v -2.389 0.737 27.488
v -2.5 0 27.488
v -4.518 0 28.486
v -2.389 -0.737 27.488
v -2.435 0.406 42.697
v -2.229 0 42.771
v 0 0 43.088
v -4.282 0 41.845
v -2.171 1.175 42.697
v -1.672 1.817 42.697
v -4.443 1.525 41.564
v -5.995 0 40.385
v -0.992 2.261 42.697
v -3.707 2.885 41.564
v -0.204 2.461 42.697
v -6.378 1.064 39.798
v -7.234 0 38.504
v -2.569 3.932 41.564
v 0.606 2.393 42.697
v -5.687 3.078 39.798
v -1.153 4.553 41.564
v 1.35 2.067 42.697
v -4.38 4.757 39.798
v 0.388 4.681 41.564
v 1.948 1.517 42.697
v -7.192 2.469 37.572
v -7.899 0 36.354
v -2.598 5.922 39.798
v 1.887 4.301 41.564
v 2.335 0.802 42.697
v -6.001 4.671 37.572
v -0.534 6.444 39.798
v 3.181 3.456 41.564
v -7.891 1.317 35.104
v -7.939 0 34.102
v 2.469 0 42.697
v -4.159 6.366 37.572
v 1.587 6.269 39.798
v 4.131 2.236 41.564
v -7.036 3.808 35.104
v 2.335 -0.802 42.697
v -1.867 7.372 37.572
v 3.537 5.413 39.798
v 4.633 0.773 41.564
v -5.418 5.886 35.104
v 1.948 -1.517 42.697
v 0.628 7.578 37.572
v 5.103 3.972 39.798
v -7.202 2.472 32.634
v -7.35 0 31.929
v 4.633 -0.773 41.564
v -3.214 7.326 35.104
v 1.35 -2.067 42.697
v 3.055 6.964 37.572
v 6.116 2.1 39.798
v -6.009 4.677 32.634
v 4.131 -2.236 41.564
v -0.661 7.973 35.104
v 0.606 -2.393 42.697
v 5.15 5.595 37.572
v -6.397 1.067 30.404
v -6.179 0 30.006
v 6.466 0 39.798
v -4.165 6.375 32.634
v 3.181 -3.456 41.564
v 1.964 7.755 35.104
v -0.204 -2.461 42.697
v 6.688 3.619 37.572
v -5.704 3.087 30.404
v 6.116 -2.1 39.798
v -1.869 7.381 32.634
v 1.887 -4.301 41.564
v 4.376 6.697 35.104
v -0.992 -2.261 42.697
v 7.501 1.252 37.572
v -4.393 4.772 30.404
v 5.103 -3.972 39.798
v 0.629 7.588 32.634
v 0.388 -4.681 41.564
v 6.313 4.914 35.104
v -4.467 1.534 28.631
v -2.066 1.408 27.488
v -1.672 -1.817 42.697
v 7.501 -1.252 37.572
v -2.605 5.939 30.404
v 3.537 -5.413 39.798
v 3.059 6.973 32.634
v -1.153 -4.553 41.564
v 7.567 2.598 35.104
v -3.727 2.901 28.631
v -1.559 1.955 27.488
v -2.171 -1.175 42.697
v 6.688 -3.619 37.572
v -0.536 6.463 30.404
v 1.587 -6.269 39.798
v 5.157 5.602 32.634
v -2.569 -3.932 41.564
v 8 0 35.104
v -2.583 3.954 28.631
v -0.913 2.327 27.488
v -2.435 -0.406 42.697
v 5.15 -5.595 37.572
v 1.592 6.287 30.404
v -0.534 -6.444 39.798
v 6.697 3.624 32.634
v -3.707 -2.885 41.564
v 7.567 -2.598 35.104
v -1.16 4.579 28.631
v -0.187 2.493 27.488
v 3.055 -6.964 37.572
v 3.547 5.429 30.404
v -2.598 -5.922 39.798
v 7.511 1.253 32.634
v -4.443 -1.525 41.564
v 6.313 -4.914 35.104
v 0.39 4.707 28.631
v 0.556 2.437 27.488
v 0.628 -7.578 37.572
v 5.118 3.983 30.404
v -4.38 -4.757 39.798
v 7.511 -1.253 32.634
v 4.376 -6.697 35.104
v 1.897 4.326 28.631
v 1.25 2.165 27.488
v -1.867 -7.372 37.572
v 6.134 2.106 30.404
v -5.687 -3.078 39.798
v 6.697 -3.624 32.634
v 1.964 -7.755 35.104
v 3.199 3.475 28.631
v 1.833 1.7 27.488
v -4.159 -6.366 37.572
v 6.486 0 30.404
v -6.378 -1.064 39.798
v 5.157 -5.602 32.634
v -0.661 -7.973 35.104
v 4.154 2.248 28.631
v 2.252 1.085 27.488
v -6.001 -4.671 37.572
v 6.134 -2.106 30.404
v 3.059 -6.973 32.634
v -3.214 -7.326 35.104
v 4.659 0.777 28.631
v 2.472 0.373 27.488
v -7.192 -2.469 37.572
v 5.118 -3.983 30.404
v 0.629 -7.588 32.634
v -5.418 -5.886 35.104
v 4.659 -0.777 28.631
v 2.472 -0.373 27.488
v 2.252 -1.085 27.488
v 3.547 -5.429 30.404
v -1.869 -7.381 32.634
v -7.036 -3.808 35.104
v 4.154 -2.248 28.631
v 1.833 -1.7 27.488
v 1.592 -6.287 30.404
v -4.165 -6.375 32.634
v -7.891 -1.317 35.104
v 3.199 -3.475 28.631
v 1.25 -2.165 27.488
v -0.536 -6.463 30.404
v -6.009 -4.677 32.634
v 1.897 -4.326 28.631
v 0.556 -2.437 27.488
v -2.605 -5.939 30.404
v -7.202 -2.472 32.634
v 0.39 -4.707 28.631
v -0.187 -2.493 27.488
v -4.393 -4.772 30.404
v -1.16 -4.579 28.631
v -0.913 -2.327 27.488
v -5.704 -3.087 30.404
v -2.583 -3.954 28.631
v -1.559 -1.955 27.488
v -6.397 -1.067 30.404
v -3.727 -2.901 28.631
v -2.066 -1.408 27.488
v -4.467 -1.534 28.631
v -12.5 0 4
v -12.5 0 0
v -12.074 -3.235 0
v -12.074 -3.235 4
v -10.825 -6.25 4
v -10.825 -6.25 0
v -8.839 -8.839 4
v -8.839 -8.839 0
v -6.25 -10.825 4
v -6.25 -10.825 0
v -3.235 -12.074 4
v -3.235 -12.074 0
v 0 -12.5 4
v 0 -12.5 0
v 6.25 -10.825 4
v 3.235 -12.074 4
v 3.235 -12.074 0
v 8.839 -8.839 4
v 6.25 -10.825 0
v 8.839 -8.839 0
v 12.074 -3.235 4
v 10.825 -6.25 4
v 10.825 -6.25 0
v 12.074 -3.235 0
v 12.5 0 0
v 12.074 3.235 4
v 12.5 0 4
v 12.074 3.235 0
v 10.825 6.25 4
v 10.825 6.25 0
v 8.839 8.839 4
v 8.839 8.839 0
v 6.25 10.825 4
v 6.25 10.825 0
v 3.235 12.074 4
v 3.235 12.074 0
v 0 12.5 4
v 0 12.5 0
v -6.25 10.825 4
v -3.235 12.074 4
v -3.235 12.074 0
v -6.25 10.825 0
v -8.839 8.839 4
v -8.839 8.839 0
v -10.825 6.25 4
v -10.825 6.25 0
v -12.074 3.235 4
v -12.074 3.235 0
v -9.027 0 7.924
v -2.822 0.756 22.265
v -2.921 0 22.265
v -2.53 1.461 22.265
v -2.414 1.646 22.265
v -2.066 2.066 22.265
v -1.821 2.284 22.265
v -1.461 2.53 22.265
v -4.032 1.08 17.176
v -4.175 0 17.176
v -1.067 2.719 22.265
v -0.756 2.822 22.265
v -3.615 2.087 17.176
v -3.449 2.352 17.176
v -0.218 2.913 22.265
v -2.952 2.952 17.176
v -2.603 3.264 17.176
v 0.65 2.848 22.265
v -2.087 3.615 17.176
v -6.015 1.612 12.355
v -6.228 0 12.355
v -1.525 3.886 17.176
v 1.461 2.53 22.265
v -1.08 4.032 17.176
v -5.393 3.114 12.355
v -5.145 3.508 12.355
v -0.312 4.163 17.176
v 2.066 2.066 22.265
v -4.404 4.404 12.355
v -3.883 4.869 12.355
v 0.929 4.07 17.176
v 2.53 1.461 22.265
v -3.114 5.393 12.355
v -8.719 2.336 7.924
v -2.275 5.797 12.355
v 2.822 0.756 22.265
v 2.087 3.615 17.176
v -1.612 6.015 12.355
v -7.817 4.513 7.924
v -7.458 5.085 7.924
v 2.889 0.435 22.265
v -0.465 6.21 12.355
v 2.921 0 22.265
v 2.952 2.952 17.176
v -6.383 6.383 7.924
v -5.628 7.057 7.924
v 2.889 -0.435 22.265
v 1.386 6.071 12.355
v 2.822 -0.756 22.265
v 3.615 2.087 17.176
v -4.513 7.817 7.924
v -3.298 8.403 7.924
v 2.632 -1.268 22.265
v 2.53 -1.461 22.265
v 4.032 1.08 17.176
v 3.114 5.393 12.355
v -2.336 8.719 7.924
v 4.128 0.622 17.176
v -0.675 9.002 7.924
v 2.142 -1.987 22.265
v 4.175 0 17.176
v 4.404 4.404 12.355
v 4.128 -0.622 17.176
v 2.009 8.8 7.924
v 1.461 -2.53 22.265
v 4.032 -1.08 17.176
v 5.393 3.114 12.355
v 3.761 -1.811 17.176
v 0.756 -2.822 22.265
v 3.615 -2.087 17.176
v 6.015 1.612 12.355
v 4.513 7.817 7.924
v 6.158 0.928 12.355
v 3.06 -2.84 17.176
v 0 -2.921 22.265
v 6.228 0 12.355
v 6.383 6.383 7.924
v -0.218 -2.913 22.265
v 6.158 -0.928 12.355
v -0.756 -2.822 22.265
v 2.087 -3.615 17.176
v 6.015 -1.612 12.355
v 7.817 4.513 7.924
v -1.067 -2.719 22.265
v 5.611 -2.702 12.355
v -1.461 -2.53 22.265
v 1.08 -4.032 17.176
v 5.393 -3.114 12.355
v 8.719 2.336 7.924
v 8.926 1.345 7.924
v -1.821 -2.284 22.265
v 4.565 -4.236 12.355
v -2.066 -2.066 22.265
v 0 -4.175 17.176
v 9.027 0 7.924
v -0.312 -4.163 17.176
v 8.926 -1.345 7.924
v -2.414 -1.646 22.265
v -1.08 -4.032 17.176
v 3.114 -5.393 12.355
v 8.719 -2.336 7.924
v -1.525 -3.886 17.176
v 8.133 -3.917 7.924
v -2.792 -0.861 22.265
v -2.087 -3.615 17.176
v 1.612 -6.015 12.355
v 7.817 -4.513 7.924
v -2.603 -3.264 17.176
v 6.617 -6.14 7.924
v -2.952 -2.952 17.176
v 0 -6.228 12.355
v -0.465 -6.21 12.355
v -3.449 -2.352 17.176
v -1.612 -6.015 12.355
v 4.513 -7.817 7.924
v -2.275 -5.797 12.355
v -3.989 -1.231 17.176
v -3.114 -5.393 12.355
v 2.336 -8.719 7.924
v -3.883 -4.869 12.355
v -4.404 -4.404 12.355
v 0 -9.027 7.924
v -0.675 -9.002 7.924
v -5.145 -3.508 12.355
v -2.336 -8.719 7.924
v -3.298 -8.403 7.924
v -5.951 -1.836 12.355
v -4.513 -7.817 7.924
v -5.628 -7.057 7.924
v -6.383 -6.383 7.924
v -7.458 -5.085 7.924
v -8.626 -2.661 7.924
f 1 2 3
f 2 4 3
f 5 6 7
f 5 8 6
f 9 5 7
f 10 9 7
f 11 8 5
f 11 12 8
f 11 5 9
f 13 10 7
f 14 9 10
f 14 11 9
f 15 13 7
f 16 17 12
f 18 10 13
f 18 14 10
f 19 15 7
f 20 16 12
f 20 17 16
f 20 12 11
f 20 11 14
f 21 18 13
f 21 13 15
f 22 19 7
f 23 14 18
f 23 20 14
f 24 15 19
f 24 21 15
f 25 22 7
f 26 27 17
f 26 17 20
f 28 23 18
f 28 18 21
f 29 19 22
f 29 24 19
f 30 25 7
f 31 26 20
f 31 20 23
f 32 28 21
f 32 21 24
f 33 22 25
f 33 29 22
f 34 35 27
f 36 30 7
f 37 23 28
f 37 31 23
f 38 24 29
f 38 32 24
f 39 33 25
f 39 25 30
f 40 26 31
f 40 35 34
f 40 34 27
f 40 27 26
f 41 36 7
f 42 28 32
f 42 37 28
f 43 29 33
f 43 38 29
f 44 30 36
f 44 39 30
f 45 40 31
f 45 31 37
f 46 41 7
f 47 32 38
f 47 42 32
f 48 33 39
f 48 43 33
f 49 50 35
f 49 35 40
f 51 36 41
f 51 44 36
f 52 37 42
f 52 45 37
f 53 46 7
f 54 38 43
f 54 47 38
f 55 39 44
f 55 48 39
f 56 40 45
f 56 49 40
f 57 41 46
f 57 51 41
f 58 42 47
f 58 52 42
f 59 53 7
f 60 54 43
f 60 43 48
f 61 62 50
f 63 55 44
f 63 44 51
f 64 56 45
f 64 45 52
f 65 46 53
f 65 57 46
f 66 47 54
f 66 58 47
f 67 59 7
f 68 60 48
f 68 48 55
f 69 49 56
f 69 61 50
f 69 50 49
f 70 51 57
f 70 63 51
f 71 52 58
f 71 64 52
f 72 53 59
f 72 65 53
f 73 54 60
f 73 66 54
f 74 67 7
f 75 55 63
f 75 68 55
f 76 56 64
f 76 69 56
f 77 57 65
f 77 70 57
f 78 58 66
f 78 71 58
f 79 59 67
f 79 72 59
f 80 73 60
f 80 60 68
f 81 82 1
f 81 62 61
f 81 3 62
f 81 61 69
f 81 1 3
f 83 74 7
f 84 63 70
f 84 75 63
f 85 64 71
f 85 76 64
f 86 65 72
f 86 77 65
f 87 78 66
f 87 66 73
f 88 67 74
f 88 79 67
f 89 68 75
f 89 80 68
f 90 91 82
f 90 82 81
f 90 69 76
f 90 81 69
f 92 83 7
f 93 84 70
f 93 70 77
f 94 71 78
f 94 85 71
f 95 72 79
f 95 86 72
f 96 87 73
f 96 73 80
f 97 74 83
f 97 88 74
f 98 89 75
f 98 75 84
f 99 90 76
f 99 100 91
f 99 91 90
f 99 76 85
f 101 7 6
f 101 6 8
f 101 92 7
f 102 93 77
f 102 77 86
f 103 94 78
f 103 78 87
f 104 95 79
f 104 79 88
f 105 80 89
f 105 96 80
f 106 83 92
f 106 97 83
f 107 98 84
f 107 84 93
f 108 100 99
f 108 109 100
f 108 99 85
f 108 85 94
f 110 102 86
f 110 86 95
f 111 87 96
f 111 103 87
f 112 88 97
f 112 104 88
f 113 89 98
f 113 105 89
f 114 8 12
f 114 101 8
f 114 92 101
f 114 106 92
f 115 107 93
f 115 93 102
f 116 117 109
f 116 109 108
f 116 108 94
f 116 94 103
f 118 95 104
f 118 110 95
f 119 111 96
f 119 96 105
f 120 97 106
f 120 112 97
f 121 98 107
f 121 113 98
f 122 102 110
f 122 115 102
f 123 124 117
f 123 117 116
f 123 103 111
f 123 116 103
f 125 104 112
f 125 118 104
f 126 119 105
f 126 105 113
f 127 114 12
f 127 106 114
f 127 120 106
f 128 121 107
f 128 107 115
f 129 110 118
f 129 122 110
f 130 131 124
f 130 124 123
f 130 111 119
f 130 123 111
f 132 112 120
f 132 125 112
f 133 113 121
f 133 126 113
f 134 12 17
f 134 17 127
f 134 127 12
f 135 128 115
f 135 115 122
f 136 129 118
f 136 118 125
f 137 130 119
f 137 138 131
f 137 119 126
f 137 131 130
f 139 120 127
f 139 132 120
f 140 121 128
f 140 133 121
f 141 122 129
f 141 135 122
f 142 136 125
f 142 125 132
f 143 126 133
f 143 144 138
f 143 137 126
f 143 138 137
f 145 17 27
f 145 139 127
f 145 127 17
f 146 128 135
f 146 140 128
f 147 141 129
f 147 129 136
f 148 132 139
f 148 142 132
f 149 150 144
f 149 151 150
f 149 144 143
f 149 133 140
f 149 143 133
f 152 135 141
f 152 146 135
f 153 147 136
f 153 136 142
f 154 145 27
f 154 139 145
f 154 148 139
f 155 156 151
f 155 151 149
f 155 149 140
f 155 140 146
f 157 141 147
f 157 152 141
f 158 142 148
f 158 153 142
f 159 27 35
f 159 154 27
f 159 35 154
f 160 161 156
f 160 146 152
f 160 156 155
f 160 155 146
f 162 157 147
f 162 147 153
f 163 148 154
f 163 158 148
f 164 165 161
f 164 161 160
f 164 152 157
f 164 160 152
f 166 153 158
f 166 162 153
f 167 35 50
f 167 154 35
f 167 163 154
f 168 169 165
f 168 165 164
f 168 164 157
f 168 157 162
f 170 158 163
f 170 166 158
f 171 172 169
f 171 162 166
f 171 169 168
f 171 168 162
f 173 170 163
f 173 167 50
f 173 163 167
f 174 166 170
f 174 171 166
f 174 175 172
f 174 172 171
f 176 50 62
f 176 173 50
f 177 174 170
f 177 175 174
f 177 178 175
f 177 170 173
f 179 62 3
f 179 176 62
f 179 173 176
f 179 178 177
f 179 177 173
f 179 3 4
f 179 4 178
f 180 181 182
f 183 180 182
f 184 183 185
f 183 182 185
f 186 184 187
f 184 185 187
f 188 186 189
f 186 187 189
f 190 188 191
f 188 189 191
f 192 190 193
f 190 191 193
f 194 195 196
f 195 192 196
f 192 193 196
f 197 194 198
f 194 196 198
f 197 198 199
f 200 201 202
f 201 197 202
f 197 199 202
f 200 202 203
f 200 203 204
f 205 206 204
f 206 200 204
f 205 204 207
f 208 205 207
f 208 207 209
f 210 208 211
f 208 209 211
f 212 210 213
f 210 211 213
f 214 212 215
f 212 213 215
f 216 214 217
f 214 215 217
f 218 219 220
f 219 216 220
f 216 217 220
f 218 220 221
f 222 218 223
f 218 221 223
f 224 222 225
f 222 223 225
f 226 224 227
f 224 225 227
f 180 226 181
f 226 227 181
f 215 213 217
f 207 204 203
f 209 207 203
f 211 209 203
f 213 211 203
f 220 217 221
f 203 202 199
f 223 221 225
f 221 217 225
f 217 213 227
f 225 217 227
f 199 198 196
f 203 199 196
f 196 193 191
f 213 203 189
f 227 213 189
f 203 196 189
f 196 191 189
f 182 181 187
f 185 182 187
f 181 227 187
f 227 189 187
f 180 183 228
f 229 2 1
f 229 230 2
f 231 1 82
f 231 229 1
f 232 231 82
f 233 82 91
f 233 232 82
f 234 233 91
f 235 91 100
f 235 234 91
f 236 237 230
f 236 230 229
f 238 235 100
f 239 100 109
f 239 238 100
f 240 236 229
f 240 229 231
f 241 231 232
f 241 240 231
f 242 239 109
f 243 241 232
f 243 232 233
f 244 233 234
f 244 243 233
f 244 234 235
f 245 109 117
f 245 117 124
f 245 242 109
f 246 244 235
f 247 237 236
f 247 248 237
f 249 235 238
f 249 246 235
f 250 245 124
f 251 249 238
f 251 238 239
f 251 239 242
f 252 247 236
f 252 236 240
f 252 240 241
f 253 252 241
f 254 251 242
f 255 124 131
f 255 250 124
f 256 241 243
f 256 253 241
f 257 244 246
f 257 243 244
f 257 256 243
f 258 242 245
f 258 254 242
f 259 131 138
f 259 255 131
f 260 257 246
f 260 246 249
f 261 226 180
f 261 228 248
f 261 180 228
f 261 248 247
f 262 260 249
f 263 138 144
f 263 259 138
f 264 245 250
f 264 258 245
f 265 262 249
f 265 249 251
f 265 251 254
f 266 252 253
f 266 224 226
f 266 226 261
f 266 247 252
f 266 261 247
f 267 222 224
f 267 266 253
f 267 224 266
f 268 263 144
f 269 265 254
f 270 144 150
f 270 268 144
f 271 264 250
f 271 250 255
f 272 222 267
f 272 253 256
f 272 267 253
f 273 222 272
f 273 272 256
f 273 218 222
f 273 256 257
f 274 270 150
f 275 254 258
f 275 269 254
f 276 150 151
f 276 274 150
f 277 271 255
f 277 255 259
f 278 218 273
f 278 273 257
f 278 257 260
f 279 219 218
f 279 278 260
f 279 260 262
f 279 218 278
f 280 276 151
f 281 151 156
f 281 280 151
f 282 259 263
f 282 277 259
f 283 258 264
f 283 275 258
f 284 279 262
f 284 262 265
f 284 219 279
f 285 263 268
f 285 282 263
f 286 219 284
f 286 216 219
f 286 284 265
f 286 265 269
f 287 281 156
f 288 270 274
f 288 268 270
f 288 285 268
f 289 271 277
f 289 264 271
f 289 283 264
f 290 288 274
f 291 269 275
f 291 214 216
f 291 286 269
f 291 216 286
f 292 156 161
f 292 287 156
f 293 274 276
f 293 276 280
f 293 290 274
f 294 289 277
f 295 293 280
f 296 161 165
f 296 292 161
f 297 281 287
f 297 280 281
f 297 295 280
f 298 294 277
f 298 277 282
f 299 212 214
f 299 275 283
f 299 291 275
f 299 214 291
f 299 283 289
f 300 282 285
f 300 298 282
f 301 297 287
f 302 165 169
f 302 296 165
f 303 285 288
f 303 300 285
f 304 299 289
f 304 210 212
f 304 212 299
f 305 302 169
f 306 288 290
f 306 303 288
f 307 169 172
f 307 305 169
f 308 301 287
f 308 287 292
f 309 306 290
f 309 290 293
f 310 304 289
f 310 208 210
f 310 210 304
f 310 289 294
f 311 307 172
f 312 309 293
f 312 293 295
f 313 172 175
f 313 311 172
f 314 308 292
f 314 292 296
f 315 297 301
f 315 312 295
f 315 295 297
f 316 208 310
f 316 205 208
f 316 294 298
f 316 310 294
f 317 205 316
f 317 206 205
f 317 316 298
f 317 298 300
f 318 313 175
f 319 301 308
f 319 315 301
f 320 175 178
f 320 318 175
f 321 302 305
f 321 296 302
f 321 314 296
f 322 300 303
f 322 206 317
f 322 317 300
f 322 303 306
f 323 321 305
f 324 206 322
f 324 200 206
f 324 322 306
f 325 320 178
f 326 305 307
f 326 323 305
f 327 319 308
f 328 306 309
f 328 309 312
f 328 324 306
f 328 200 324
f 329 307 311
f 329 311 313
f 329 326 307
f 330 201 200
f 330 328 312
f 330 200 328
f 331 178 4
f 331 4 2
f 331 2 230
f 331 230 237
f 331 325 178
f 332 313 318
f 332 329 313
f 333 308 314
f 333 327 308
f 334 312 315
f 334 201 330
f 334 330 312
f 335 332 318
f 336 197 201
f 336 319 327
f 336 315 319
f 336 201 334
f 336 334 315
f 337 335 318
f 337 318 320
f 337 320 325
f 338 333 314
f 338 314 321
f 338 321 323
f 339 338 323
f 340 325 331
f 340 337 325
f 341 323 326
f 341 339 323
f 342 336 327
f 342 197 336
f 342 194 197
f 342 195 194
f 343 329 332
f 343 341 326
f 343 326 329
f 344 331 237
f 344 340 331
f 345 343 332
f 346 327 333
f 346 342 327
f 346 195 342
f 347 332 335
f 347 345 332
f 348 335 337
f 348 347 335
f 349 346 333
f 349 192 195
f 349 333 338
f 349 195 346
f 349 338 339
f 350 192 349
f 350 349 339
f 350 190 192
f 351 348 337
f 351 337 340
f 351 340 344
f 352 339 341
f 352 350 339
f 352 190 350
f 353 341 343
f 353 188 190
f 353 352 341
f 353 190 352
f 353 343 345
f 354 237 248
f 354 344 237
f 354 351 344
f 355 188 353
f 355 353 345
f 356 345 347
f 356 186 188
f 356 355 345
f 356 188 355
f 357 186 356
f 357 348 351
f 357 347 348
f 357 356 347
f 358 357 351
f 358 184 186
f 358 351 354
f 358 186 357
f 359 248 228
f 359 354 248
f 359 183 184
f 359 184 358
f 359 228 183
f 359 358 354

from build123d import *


# Not quite as in the source:
# - a feature of the source that left no trace in its solid (it failed there, or was rolled back) is left out


with BuildPart() as f1:
    # F0 (on Front) → F1 (revolve)
    with BuildSketch(Plane.XZ):
        with BuildLine():
            ThreePointArc((-2.5, 27.4883110198), (-1.2659509046, 27.1884526113), (0, 27.0876530966))
            Line((0, 27.0876530966), (0, 43.0876530966))
            ThreePointArc((0, 43.0876530966), (-7.8992004853, 36.3536040012), (-2.5, 27.4883110198))
        make_face()
    revolve(axis=Axis((0, 0, 35.0876530966), (0, 0, -1)))

    # F0 (on Front) → F2 (revolve)
    with BuildSketch(Plane.XZ):
        with BuildLine():
            ThreePointArc((-2.5, 27.4883110198), (-5.1040521689, 14.7240958602), (-12.5, 4))
            Line((-12.5, 4), (-2.5, 4))
            Line((-2.5, 4), (-2.5, 27.4883110198))
        make_face()
        with BuildLine():
            Line((-2.5, 4), (0, 4))
            Line((0, 4), (0, 27.0876530966))
            ThreePointArc((0, 27.0876530966), (-1.2659509046, 27.1884526113), (-2.5, 27.4883110198))
            Line((-2.5, 27.4883110198), (-2.5, 4))
        make_face()
    revolve(axis=Axis((0, 0, 15.5438265483), (0, 0, -1)))

    # F0 (on Front) → F3 (revolve)
    with BuildSketch(Plane.XZ):
        Polygon((-12.5, 0), (0, 0), (0, 4), (-2.5, 4), (-12.5, 4), align=None)
        with BuildLine():
            Line((-2.5, 4), (0, 4))
            Line((0, 4), (0, 27.0876530966))
            ThreePointArc((0, 27.0876530966), (-1.2659509046, 27.1884526113), (-2.5, 27.4883110198))
            Line((-2.5, 27.4883110198), (-2.5, 4))
        make_face()
    revolve(axis=Axis((0, 0, 2), (0, 0, 1)))


solid = f1.part
